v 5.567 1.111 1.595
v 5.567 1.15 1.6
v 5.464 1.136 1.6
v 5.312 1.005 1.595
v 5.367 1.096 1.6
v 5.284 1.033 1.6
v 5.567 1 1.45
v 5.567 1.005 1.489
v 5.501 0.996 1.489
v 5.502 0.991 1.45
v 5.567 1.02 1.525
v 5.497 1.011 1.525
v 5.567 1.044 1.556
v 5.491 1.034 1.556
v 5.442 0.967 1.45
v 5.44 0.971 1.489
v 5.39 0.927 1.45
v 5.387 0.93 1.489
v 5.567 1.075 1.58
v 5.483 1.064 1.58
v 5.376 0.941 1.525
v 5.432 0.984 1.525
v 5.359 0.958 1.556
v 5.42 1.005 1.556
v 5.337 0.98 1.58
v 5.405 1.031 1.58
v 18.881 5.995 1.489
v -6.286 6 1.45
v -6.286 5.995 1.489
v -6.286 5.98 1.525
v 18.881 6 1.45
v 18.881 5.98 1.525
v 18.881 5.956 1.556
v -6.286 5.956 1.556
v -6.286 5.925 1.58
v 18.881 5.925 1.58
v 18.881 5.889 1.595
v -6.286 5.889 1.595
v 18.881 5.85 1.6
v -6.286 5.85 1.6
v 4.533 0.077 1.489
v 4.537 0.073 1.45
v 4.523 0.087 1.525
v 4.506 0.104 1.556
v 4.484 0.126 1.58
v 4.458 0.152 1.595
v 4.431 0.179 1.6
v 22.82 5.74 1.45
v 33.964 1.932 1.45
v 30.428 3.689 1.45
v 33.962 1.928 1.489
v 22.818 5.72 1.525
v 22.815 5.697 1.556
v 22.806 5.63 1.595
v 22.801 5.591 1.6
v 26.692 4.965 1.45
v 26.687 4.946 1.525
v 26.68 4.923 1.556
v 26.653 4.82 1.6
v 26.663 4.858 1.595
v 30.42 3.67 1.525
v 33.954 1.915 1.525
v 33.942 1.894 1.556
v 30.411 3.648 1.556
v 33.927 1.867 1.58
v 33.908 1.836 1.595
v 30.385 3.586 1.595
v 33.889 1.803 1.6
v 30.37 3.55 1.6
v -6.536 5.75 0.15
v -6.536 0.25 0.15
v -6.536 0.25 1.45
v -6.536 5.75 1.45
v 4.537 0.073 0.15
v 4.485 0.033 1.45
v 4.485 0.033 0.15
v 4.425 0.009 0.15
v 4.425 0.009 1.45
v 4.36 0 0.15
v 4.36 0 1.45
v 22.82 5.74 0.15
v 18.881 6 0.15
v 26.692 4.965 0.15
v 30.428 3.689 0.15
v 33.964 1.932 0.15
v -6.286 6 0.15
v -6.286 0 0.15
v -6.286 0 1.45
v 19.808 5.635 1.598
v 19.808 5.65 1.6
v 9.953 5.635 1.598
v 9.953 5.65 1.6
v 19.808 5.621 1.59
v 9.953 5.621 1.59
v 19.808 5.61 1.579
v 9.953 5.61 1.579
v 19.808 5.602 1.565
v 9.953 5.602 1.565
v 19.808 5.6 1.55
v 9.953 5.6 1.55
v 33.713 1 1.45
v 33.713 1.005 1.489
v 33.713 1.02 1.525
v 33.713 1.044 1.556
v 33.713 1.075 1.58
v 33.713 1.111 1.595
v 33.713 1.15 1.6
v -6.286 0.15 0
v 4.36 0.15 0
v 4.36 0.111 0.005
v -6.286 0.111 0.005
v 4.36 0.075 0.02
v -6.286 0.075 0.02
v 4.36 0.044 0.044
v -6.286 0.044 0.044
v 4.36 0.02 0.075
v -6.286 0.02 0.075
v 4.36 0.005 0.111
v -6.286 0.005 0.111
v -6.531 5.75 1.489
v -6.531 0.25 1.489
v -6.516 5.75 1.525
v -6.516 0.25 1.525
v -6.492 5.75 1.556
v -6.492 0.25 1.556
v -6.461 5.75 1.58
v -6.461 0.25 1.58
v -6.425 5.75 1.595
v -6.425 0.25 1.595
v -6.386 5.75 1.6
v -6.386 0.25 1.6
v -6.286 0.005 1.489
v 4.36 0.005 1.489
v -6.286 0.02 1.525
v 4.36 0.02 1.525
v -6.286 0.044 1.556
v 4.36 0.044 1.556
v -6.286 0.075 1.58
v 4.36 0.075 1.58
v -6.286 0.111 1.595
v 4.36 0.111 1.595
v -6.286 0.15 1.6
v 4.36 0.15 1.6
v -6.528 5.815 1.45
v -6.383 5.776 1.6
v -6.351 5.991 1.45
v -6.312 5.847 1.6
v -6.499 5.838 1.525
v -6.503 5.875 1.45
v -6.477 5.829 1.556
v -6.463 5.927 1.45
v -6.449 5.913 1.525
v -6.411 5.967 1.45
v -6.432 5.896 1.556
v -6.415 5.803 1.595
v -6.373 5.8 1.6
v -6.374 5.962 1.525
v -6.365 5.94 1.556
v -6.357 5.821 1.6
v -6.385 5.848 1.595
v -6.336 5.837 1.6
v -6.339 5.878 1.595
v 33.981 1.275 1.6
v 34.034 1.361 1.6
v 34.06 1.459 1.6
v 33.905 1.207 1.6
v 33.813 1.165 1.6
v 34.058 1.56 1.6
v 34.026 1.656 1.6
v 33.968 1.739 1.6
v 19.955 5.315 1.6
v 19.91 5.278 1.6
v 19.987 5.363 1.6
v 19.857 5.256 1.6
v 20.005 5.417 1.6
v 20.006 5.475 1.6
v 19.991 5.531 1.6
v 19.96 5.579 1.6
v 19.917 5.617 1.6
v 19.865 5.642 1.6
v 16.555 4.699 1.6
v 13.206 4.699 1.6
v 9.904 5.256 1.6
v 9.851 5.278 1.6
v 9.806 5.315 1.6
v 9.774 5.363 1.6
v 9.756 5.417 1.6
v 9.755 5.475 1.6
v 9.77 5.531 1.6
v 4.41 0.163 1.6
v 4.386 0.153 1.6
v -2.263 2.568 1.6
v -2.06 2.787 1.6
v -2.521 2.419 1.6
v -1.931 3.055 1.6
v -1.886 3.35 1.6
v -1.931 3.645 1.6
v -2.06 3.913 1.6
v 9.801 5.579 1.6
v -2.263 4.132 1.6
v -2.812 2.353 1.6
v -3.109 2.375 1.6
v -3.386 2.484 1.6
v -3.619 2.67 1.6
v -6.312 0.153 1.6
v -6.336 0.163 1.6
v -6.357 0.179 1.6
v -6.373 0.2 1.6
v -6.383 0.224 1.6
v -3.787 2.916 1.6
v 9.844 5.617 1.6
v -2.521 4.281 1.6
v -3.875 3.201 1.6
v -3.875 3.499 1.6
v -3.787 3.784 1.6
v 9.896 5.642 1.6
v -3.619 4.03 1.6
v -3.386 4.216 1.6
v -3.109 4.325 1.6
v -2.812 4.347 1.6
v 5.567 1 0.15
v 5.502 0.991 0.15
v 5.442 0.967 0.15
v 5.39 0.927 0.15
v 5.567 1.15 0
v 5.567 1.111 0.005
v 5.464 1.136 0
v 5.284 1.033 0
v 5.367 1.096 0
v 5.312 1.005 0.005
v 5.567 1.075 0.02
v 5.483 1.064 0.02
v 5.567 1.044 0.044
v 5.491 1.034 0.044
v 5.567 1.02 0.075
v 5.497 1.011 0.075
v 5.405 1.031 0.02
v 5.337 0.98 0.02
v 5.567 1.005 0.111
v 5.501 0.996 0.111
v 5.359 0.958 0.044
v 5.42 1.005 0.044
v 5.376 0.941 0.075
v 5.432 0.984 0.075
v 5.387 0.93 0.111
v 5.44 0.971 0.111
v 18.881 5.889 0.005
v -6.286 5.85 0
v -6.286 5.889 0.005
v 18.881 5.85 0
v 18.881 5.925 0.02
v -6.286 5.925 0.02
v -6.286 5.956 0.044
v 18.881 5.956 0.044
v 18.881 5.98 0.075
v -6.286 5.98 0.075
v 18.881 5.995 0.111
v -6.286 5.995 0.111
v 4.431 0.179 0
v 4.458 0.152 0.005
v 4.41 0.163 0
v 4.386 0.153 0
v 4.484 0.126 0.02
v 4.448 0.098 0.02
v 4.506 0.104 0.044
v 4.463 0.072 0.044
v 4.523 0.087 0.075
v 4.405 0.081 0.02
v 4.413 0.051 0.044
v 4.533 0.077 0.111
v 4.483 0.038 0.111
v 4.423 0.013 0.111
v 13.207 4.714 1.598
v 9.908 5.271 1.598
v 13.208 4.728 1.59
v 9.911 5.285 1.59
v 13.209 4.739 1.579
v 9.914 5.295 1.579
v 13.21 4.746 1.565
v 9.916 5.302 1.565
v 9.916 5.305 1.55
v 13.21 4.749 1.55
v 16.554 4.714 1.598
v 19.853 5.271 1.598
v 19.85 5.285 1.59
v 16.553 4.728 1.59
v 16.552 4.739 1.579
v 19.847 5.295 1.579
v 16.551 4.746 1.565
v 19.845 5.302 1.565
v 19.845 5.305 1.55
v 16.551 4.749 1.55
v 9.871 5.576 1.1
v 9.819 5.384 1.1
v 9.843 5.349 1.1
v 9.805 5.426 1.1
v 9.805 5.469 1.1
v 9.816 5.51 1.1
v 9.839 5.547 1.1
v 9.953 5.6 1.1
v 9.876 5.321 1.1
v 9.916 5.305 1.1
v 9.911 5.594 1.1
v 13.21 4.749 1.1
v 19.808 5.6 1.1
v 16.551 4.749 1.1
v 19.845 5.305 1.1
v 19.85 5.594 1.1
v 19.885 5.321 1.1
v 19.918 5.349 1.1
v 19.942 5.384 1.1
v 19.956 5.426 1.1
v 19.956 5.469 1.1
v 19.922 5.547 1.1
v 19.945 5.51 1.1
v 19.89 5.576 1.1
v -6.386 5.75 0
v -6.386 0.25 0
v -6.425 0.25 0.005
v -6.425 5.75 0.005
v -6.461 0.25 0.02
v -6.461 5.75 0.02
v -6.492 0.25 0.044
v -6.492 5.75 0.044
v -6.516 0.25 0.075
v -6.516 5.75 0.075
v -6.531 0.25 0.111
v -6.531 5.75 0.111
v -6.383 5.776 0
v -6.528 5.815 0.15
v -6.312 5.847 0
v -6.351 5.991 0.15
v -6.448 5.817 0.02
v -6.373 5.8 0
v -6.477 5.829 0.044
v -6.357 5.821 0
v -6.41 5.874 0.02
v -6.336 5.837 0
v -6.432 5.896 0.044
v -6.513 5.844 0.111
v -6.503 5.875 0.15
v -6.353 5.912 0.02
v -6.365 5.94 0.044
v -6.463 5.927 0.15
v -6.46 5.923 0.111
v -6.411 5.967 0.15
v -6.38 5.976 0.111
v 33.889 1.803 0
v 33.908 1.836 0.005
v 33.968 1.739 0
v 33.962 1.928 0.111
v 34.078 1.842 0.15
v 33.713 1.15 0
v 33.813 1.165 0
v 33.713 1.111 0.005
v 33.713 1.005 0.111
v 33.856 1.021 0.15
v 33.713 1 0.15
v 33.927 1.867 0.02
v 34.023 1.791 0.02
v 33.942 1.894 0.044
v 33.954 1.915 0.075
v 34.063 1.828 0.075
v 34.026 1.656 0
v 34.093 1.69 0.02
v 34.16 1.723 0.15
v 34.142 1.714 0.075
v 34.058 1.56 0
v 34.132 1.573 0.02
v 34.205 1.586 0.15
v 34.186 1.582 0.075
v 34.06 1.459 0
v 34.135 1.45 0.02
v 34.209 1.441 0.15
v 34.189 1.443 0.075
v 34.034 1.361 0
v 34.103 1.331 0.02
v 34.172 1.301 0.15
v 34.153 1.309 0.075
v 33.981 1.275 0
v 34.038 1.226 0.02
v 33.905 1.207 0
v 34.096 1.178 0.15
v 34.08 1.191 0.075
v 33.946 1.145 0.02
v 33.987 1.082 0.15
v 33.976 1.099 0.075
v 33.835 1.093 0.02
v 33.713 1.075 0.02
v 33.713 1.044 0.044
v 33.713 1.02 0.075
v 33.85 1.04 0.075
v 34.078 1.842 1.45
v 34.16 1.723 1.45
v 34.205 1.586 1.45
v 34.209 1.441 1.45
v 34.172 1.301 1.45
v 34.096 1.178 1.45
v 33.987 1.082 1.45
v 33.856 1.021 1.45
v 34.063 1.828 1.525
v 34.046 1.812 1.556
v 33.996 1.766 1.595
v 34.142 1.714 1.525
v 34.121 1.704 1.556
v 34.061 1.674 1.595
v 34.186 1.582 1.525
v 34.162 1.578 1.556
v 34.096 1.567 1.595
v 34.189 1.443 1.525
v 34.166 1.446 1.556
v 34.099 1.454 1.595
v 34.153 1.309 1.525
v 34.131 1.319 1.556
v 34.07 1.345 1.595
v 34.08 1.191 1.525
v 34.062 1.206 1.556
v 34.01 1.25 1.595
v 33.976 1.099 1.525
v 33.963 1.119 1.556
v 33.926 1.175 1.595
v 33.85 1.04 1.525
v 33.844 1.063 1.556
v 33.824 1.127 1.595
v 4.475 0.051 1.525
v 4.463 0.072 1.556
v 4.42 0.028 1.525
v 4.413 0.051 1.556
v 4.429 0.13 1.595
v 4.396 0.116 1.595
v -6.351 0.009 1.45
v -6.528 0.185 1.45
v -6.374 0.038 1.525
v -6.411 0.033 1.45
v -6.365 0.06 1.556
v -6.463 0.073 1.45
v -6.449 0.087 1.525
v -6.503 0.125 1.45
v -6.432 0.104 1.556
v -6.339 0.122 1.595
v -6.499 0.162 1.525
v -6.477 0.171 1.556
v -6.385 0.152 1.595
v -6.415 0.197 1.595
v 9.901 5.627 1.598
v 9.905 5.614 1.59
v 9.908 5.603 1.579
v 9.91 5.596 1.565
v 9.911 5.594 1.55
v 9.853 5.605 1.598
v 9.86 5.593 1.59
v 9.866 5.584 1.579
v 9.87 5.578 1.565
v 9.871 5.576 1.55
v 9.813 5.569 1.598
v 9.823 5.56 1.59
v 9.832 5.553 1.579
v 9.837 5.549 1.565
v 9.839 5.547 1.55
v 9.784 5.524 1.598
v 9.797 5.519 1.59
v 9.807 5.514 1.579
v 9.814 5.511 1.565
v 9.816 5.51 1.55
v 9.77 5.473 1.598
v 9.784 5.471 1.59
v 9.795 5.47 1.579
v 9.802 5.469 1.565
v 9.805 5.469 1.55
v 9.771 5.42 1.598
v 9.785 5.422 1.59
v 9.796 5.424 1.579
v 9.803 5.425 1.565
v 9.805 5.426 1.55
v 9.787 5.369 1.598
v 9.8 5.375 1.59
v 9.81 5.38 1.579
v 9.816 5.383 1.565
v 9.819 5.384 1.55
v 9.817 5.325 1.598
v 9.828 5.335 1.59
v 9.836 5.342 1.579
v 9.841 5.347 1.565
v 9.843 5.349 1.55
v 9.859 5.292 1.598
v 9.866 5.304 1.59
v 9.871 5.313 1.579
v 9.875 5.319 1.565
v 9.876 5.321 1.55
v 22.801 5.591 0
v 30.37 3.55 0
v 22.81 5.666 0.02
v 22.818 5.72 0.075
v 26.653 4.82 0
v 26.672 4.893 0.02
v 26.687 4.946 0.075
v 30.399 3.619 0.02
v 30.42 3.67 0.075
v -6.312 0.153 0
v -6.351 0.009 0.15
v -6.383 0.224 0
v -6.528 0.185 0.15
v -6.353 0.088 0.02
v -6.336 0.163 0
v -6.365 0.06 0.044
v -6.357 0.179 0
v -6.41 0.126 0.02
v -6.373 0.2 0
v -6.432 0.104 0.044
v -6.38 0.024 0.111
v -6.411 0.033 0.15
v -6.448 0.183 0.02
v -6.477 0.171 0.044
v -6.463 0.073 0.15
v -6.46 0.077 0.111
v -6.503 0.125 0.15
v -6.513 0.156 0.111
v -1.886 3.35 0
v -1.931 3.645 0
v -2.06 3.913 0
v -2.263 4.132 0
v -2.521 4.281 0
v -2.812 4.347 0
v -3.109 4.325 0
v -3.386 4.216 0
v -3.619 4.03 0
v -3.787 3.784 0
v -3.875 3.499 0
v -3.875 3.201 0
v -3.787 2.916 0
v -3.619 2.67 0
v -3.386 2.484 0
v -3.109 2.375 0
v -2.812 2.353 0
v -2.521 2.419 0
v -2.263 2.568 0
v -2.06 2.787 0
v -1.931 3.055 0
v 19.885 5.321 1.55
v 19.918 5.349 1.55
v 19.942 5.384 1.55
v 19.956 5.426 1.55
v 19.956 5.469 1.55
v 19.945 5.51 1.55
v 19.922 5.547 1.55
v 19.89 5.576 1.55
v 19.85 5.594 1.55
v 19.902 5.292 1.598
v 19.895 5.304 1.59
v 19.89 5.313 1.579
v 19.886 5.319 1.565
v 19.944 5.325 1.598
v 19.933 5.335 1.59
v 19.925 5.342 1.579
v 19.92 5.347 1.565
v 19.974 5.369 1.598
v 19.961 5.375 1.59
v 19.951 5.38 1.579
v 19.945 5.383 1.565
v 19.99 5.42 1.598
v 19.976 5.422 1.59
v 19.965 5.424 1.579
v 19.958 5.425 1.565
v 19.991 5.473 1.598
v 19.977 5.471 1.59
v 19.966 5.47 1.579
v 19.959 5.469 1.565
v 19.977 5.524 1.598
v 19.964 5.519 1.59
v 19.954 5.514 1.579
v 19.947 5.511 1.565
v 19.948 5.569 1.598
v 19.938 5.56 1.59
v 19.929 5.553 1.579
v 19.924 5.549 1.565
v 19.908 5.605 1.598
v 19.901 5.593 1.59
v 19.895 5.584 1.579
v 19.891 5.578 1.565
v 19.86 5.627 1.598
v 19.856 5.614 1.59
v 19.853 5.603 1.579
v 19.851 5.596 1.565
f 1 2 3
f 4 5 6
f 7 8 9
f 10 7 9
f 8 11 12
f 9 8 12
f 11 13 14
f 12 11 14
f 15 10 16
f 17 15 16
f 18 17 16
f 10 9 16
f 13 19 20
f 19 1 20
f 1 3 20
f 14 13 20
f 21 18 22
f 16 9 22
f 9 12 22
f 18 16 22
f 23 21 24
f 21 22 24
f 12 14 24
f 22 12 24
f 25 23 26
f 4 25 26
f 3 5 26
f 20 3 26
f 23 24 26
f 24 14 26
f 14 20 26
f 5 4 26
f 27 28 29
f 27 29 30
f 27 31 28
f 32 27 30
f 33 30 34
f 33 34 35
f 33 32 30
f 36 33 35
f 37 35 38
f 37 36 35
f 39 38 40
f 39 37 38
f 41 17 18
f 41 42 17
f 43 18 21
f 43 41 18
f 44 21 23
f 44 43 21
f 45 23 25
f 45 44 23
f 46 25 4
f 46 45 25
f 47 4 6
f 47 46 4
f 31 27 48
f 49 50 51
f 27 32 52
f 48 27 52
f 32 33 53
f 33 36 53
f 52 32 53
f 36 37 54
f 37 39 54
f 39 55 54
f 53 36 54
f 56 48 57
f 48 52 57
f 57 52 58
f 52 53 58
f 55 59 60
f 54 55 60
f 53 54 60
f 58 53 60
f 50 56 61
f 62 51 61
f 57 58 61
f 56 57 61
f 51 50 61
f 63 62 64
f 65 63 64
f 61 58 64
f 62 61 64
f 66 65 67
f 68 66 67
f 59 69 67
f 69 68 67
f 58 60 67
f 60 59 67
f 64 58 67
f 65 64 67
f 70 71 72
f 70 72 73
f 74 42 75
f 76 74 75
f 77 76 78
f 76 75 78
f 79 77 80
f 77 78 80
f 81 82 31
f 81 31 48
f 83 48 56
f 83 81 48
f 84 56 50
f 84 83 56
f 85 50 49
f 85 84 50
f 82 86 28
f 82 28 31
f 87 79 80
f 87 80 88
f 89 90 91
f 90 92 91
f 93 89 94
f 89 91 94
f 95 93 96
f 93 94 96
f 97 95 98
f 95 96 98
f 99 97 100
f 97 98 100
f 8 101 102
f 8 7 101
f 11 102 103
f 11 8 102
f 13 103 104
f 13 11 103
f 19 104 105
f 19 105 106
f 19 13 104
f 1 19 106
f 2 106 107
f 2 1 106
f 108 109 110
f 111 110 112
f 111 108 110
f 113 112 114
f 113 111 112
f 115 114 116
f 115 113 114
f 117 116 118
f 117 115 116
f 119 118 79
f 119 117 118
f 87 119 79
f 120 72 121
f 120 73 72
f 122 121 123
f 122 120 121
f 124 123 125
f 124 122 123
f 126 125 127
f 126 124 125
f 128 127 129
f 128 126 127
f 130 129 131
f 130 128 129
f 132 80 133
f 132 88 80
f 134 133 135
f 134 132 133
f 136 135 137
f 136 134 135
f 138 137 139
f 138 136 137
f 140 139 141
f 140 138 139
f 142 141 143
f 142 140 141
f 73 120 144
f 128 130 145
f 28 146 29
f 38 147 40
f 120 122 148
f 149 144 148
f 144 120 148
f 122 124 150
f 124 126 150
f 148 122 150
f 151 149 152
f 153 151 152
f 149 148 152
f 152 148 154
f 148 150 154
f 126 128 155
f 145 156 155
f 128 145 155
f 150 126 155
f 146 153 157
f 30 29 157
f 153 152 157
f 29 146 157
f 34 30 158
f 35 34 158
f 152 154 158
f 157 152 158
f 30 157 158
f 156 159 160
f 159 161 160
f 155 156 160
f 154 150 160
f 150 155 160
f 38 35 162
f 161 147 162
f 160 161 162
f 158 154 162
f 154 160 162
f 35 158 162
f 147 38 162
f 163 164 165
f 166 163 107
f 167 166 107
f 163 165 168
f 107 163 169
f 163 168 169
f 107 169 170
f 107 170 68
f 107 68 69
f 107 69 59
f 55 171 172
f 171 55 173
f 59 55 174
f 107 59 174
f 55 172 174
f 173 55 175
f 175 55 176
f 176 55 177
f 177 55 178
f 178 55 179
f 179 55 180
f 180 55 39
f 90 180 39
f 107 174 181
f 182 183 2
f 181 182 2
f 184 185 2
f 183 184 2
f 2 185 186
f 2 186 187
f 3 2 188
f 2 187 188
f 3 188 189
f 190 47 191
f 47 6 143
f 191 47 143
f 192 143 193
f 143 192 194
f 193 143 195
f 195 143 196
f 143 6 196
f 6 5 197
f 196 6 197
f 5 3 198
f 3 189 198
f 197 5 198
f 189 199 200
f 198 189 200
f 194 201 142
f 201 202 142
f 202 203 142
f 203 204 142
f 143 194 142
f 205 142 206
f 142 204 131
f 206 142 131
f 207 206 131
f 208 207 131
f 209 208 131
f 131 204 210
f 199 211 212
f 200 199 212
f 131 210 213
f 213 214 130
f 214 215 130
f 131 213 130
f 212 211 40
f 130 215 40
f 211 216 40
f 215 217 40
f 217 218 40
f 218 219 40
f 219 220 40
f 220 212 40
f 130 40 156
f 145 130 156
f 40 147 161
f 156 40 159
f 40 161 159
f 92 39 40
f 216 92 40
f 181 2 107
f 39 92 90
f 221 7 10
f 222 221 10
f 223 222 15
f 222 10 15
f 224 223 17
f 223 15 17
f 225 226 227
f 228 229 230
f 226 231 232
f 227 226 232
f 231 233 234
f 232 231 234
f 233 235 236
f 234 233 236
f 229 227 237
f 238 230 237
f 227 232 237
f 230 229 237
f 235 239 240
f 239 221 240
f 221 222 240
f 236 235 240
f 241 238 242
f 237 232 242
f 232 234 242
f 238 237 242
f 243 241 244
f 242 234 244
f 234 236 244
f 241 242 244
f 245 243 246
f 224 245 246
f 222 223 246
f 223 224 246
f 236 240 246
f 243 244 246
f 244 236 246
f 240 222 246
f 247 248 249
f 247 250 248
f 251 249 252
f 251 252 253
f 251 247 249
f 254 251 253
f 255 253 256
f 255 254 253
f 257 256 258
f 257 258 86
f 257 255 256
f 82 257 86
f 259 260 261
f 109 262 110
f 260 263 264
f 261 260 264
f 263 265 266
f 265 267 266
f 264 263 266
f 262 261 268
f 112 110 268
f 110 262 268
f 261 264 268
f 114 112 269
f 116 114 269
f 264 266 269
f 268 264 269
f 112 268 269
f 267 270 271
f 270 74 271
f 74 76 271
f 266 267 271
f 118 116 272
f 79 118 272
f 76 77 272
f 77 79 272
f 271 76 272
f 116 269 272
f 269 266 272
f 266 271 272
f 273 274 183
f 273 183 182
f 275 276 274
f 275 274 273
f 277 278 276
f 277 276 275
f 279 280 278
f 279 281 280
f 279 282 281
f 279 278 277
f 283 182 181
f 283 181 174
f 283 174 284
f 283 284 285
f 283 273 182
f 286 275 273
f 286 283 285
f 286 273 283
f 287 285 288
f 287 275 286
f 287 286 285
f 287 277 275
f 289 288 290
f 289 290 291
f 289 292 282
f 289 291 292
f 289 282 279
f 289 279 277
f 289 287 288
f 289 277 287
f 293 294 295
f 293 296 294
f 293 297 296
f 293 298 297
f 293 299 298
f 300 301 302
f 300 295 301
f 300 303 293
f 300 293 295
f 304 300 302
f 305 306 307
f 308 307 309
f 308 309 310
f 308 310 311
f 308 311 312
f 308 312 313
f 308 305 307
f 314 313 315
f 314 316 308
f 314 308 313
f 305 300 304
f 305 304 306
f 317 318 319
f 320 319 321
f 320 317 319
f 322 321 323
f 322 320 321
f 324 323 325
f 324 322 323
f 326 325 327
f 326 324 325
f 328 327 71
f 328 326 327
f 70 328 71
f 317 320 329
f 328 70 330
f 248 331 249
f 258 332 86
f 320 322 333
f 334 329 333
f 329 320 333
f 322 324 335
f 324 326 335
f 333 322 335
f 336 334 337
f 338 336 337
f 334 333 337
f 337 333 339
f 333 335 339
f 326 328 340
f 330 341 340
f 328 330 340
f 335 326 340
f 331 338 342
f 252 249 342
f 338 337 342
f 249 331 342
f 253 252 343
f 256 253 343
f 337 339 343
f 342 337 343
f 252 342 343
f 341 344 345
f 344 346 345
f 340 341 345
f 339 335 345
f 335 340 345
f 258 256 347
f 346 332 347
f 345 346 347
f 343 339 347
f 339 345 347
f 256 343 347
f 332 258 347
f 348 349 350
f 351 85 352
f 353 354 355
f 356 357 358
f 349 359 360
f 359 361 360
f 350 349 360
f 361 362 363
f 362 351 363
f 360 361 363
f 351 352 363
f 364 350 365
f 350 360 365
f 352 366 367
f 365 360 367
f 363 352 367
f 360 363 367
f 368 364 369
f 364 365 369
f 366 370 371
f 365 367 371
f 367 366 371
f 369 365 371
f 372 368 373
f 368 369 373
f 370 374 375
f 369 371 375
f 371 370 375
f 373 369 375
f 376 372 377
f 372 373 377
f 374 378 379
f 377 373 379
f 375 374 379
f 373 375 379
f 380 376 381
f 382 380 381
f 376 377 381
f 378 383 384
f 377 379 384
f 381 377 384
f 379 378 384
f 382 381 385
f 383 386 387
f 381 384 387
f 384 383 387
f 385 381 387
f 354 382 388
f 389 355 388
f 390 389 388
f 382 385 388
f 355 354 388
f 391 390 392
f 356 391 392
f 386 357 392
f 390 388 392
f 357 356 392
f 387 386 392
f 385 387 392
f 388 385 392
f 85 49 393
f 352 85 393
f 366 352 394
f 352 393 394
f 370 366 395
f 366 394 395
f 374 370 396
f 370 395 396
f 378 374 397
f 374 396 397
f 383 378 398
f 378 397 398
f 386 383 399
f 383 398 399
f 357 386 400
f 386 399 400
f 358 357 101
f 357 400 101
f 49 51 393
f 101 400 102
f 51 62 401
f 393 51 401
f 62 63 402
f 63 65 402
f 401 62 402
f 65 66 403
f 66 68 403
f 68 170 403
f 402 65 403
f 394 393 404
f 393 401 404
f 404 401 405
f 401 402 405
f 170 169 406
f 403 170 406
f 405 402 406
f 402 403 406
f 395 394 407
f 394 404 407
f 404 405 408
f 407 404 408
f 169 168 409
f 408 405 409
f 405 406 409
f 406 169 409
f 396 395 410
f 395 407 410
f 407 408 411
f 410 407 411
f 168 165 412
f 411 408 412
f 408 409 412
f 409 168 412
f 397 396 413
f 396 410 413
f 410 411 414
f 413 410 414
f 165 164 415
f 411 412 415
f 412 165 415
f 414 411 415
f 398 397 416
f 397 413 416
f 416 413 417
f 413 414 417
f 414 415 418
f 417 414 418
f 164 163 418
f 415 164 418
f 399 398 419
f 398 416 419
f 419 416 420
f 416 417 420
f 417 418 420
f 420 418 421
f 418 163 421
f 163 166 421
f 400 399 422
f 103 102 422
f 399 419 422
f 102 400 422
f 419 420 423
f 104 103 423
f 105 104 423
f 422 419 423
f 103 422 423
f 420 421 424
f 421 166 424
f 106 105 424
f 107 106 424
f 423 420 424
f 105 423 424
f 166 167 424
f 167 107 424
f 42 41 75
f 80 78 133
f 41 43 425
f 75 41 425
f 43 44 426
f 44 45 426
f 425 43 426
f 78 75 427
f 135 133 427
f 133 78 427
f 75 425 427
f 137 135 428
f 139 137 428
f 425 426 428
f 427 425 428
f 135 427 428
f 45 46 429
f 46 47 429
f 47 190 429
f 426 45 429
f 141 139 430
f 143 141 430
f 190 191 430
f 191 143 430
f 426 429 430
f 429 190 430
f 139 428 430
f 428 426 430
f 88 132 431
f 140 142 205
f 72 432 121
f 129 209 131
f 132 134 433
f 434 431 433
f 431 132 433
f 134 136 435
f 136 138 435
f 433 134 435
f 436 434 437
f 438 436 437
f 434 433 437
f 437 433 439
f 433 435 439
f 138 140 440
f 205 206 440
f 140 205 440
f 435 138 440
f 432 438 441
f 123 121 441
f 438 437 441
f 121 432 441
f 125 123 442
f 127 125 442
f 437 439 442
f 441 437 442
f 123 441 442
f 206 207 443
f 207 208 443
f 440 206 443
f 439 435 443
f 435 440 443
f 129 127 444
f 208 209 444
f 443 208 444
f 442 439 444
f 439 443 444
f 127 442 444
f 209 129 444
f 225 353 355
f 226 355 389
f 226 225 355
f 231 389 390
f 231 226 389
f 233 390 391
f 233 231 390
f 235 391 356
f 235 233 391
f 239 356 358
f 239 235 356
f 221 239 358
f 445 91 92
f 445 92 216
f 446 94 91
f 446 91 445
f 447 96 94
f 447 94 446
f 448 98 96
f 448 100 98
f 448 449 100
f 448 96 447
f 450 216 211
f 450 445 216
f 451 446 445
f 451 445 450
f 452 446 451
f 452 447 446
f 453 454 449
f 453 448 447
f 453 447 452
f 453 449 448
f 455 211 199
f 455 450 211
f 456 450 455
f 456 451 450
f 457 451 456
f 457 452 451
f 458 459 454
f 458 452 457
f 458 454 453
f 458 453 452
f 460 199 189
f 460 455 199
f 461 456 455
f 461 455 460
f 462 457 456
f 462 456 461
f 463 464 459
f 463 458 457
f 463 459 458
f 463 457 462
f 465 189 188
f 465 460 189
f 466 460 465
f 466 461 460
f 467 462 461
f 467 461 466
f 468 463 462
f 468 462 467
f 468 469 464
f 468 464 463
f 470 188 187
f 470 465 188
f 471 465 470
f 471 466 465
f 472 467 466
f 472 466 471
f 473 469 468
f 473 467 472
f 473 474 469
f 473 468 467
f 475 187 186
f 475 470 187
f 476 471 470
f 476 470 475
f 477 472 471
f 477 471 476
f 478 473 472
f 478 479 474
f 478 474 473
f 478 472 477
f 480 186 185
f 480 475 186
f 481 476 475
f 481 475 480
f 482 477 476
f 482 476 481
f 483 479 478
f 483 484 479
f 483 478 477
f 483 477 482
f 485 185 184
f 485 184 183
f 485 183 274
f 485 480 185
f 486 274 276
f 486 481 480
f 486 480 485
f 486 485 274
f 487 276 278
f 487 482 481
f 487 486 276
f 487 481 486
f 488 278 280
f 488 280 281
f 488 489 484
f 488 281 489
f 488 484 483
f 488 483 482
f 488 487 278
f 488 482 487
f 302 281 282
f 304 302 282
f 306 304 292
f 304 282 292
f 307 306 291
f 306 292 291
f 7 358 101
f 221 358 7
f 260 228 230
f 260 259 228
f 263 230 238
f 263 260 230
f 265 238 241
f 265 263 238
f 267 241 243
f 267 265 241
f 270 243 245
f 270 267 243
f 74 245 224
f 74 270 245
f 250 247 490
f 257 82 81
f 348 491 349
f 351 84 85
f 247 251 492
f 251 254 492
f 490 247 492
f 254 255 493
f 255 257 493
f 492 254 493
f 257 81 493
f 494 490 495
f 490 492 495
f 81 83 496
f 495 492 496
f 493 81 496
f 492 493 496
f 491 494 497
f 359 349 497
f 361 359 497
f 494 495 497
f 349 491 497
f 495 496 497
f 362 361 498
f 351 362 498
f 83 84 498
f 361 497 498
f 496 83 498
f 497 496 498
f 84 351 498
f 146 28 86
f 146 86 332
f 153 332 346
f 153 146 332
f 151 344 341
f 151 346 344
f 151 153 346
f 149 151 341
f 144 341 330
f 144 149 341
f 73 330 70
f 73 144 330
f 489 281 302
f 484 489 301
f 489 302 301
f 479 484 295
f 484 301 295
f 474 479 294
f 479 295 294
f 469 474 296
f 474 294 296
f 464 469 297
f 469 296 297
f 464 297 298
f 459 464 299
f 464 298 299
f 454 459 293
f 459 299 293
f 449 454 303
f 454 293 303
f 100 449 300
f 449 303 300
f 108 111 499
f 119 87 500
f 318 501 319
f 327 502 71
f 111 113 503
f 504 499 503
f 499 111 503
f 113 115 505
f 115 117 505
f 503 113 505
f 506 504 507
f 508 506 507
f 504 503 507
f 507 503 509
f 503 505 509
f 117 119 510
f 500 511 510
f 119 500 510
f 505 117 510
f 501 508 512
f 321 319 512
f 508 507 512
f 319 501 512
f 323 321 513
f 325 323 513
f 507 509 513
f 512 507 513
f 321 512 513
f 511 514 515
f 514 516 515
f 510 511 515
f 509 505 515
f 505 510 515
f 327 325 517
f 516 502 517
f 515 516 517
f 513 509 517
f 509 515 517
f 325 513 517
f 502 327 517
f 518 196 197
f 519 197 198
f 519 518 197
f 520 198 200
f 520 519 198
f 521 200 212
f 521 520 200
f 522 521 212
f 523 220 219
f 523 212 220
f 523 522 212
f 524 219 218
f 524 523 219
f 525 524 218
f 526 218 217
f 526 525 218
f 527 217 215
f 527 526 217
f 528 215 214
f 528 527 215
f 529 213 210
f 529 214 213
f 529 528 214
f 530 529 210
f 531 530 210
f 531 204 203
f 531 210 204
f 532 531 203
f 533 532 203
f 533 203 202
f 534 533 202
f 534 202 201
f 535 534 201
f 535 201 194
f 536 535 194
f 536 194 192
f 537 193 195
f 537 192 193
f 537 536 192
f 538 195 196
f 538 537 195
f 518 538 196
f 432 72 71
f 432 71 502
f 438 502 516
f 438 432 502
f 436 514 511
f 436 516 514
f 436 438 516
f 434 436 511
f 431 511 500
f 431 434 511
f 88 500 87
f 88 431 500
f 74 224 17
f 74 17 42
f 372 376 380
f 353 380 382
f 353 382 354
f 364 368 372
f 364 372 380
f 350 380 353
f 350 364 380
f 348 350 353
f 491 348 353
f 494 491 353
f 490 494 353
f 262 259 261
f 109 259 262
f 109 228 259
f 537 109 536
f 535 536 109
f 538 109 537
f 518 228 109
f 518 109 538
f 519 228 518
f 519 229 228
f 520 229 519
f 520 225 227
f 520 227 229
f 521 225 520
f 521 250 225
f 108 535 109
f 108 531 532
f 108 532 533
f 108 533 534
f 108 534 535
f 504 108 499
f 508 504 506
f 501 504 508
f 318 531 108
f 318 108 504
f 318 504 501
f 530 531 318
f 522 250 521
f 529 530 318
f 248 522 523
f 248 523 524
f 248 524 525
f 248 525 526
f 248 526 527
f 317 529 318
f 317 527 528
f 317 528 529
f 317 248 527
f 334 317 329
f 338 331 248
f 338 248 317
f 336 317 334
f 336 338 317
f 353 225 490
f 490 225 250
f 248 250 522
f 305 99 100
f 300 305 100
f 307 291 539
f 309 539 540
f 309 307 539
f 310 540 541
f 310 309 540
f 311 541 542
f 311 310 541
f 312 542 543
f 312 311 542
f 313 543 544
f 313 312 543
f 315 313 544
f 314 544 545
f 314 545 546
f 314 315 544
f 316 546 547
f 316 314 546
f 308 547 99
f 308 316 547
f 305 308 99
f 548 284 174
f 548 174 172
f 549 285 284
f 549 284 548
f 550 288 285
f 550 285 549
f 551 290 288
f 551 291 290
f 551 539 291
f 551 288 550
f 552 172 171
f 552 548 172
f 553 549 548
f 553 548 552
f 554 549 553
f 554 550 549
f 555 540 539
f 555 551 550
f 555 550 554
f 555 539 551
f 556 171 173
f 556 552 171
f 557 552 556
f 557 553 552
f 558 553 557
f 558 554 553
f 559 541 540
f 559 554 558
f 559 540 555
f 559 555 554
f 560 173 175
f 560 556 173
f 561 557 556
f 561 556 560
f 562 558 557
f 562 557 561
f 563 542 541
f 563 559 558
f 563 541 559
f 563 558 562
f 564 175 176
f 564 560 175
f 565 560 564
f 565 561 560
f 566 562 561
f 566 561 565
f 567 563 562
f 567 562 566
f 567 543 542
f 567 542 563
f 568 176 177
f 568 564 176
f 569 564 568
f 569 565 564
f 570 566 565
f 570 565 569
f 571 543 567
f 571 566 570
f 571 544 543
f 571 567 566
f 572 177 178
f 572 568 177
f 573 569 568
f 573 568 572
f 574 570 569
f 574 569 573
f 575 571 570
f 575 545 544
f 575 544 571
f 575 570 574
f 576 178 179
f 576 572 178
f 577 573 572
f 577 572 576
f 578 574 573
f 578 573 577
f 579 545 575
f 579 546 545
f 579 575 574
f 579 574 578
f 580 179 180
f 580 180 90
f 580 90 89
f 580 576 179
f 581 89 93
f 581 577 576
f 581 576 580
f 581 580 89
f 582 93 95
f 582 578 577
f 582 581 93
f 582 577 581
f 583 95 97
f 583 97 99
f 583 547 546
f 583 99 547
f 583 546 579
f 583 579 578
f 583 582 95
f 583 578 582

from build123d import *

# Parameters (mm, degrees)
BOSS_EXTRUDE1_DEPTH = 1.6
FILLET1_R           = 0.5
FILLET2_R           = 0.25
FILLET3_R           = 0.15
SKETCH2_R           = 1
CUT_EXTRUDE3_DEPTH  = 35.771862445
CUT_EXTRUDE4_DEPTH  = 0.5
FILLET4_R           = 0.15
FILLET5_R           = 0.05


with BuildPart() as part:
    # Sketch1 → Boss-Extrude1 (new body)
    with BuildSketch(Plane.XY):
        with BuildLine():
            Line((4.463625287, 0), (-6.536374713, 0))
            Line((-6.536374713, 0), (-6.536374713, 6))
            Line((-6.536374713, 6), (18.880501335, 6))
            ThreePointArc((18.880501335, 6), (27.540755373, 4.722813233), (35.463625287, 1))
            Line((35.463625287, 1), (5.463625287, 1))
            Line((5.463625287, 1), (4.463625287, 0))
        make_face()
    extrude(amount=BOSS_EXTRUDE1_DEPTH)

    # Fillet1
    fillet1_edges = [part.edges().sort_by_distance(p)[0] for p in [
        (35.463625287, 1, 0.8),
    ]]
    fillet(fillet1_edges, radius=FILLET1_R)

    # Fillet2
    fillet2_edges = [part.edges().sort_by_distance(p)[0] for p in [
        (4.463625287, 0, 0.8),
        (-6.536374713, 0, 0.8),
        (-6.536374713, 6, 0.8),
        (5.463625287, 1, 0.8),
    ]]
    fillet(fillet2_edges, radius=FILLET2_R)

    # Fillet3
    fillet3_edges = [part.edges().sort_by_distance(p)[0] for p in [
        (6.297063311, 6, 1.6),
        (26.691835994, 4.96520414, 0),
        (26.691835994, 4.96520414, 1.6),
        (34.195651711, 1.369811089, 0),
        (34.195651711, 1.369811089, 1.6),
        (19.640038493, 1, 0),
        (19.640038493, 1, 1.6),
        (4.963625287, 0.5, 0),
        (4.963625287, 0.5, 1.6),
        (-0.963151409, 0, 0),
        (-6.536374713, 3, 0),
        (-6.463151409, 5.926776695, 0),
        (-6.463151409, 0.073223305, 0),
        (4.455742754, 0.019030117, 0),
        (-0.963151409, 0, 1.6),
        (-6.536374713, 3, 1.6),
        (-6.463151409, 5.926776695, 1.6),
        (-6.463151409, 0.073223305, 1.6),
        (4.455742754, 0.019030117, 1.6),
        (5.471507819, 0.980969883, 0),
        (5.471507819, 0.980969883, 1.6),
        (6.297063311, 6, 0),
    ]]
    fillet(fillet3_edges, radius=FILLET3_R)

    # Sketch2 → Cut-Extrude3 (cut, through all)
    with BuildSketch(Plane.XY):
        with Locations((-2.886374713, 3.35)):
            Circle(SKETCH2_R)
    extrude(amount=CUT_EXTRUDE3_DEPTH, mode=Mode.SUBTRACT)

    # Sketch3 → Cut-Extrude4 (cut)
    with BuildSketch(Plane.XY.offset(1.6)):
        with BuildLine():
            Line((20.880501335, 5.6), (8.880501335, 5.6))
            ThreePointArc((8.880501335, 5.6), (14.880501335, 4.678784028), (20.880501335, 5.6))
        make_face()
    extrude(amount=-CUT_EXTRUDE4_DEPTH, mode=Mode.SUBTRACT)

    # Fillet4
    fillet4_edges = [part.edges().sort_by_distance(p)[0] for p in [
        (20.880501335, 5.6, 1.35),
        (8.880501335, 5.6, 1.35),
    ]]
    fillet(fillet4_edges, radius=FILLET4_R)

    # Fillet5
    fillet5_edges = [part.edges().sort_by_distance(p)[0] for p in [
        (14.880501335, 4.678784028, 1.6),
        (14.880501335, 5.6, 1.6),
        (9.804574431, 5.46876365, 1.6),
        (19.956428239, 5.46876365, 1.6),
    ]]
    fillet(fillet5_edges, radius=FILLET5_R)


solid = part.part
